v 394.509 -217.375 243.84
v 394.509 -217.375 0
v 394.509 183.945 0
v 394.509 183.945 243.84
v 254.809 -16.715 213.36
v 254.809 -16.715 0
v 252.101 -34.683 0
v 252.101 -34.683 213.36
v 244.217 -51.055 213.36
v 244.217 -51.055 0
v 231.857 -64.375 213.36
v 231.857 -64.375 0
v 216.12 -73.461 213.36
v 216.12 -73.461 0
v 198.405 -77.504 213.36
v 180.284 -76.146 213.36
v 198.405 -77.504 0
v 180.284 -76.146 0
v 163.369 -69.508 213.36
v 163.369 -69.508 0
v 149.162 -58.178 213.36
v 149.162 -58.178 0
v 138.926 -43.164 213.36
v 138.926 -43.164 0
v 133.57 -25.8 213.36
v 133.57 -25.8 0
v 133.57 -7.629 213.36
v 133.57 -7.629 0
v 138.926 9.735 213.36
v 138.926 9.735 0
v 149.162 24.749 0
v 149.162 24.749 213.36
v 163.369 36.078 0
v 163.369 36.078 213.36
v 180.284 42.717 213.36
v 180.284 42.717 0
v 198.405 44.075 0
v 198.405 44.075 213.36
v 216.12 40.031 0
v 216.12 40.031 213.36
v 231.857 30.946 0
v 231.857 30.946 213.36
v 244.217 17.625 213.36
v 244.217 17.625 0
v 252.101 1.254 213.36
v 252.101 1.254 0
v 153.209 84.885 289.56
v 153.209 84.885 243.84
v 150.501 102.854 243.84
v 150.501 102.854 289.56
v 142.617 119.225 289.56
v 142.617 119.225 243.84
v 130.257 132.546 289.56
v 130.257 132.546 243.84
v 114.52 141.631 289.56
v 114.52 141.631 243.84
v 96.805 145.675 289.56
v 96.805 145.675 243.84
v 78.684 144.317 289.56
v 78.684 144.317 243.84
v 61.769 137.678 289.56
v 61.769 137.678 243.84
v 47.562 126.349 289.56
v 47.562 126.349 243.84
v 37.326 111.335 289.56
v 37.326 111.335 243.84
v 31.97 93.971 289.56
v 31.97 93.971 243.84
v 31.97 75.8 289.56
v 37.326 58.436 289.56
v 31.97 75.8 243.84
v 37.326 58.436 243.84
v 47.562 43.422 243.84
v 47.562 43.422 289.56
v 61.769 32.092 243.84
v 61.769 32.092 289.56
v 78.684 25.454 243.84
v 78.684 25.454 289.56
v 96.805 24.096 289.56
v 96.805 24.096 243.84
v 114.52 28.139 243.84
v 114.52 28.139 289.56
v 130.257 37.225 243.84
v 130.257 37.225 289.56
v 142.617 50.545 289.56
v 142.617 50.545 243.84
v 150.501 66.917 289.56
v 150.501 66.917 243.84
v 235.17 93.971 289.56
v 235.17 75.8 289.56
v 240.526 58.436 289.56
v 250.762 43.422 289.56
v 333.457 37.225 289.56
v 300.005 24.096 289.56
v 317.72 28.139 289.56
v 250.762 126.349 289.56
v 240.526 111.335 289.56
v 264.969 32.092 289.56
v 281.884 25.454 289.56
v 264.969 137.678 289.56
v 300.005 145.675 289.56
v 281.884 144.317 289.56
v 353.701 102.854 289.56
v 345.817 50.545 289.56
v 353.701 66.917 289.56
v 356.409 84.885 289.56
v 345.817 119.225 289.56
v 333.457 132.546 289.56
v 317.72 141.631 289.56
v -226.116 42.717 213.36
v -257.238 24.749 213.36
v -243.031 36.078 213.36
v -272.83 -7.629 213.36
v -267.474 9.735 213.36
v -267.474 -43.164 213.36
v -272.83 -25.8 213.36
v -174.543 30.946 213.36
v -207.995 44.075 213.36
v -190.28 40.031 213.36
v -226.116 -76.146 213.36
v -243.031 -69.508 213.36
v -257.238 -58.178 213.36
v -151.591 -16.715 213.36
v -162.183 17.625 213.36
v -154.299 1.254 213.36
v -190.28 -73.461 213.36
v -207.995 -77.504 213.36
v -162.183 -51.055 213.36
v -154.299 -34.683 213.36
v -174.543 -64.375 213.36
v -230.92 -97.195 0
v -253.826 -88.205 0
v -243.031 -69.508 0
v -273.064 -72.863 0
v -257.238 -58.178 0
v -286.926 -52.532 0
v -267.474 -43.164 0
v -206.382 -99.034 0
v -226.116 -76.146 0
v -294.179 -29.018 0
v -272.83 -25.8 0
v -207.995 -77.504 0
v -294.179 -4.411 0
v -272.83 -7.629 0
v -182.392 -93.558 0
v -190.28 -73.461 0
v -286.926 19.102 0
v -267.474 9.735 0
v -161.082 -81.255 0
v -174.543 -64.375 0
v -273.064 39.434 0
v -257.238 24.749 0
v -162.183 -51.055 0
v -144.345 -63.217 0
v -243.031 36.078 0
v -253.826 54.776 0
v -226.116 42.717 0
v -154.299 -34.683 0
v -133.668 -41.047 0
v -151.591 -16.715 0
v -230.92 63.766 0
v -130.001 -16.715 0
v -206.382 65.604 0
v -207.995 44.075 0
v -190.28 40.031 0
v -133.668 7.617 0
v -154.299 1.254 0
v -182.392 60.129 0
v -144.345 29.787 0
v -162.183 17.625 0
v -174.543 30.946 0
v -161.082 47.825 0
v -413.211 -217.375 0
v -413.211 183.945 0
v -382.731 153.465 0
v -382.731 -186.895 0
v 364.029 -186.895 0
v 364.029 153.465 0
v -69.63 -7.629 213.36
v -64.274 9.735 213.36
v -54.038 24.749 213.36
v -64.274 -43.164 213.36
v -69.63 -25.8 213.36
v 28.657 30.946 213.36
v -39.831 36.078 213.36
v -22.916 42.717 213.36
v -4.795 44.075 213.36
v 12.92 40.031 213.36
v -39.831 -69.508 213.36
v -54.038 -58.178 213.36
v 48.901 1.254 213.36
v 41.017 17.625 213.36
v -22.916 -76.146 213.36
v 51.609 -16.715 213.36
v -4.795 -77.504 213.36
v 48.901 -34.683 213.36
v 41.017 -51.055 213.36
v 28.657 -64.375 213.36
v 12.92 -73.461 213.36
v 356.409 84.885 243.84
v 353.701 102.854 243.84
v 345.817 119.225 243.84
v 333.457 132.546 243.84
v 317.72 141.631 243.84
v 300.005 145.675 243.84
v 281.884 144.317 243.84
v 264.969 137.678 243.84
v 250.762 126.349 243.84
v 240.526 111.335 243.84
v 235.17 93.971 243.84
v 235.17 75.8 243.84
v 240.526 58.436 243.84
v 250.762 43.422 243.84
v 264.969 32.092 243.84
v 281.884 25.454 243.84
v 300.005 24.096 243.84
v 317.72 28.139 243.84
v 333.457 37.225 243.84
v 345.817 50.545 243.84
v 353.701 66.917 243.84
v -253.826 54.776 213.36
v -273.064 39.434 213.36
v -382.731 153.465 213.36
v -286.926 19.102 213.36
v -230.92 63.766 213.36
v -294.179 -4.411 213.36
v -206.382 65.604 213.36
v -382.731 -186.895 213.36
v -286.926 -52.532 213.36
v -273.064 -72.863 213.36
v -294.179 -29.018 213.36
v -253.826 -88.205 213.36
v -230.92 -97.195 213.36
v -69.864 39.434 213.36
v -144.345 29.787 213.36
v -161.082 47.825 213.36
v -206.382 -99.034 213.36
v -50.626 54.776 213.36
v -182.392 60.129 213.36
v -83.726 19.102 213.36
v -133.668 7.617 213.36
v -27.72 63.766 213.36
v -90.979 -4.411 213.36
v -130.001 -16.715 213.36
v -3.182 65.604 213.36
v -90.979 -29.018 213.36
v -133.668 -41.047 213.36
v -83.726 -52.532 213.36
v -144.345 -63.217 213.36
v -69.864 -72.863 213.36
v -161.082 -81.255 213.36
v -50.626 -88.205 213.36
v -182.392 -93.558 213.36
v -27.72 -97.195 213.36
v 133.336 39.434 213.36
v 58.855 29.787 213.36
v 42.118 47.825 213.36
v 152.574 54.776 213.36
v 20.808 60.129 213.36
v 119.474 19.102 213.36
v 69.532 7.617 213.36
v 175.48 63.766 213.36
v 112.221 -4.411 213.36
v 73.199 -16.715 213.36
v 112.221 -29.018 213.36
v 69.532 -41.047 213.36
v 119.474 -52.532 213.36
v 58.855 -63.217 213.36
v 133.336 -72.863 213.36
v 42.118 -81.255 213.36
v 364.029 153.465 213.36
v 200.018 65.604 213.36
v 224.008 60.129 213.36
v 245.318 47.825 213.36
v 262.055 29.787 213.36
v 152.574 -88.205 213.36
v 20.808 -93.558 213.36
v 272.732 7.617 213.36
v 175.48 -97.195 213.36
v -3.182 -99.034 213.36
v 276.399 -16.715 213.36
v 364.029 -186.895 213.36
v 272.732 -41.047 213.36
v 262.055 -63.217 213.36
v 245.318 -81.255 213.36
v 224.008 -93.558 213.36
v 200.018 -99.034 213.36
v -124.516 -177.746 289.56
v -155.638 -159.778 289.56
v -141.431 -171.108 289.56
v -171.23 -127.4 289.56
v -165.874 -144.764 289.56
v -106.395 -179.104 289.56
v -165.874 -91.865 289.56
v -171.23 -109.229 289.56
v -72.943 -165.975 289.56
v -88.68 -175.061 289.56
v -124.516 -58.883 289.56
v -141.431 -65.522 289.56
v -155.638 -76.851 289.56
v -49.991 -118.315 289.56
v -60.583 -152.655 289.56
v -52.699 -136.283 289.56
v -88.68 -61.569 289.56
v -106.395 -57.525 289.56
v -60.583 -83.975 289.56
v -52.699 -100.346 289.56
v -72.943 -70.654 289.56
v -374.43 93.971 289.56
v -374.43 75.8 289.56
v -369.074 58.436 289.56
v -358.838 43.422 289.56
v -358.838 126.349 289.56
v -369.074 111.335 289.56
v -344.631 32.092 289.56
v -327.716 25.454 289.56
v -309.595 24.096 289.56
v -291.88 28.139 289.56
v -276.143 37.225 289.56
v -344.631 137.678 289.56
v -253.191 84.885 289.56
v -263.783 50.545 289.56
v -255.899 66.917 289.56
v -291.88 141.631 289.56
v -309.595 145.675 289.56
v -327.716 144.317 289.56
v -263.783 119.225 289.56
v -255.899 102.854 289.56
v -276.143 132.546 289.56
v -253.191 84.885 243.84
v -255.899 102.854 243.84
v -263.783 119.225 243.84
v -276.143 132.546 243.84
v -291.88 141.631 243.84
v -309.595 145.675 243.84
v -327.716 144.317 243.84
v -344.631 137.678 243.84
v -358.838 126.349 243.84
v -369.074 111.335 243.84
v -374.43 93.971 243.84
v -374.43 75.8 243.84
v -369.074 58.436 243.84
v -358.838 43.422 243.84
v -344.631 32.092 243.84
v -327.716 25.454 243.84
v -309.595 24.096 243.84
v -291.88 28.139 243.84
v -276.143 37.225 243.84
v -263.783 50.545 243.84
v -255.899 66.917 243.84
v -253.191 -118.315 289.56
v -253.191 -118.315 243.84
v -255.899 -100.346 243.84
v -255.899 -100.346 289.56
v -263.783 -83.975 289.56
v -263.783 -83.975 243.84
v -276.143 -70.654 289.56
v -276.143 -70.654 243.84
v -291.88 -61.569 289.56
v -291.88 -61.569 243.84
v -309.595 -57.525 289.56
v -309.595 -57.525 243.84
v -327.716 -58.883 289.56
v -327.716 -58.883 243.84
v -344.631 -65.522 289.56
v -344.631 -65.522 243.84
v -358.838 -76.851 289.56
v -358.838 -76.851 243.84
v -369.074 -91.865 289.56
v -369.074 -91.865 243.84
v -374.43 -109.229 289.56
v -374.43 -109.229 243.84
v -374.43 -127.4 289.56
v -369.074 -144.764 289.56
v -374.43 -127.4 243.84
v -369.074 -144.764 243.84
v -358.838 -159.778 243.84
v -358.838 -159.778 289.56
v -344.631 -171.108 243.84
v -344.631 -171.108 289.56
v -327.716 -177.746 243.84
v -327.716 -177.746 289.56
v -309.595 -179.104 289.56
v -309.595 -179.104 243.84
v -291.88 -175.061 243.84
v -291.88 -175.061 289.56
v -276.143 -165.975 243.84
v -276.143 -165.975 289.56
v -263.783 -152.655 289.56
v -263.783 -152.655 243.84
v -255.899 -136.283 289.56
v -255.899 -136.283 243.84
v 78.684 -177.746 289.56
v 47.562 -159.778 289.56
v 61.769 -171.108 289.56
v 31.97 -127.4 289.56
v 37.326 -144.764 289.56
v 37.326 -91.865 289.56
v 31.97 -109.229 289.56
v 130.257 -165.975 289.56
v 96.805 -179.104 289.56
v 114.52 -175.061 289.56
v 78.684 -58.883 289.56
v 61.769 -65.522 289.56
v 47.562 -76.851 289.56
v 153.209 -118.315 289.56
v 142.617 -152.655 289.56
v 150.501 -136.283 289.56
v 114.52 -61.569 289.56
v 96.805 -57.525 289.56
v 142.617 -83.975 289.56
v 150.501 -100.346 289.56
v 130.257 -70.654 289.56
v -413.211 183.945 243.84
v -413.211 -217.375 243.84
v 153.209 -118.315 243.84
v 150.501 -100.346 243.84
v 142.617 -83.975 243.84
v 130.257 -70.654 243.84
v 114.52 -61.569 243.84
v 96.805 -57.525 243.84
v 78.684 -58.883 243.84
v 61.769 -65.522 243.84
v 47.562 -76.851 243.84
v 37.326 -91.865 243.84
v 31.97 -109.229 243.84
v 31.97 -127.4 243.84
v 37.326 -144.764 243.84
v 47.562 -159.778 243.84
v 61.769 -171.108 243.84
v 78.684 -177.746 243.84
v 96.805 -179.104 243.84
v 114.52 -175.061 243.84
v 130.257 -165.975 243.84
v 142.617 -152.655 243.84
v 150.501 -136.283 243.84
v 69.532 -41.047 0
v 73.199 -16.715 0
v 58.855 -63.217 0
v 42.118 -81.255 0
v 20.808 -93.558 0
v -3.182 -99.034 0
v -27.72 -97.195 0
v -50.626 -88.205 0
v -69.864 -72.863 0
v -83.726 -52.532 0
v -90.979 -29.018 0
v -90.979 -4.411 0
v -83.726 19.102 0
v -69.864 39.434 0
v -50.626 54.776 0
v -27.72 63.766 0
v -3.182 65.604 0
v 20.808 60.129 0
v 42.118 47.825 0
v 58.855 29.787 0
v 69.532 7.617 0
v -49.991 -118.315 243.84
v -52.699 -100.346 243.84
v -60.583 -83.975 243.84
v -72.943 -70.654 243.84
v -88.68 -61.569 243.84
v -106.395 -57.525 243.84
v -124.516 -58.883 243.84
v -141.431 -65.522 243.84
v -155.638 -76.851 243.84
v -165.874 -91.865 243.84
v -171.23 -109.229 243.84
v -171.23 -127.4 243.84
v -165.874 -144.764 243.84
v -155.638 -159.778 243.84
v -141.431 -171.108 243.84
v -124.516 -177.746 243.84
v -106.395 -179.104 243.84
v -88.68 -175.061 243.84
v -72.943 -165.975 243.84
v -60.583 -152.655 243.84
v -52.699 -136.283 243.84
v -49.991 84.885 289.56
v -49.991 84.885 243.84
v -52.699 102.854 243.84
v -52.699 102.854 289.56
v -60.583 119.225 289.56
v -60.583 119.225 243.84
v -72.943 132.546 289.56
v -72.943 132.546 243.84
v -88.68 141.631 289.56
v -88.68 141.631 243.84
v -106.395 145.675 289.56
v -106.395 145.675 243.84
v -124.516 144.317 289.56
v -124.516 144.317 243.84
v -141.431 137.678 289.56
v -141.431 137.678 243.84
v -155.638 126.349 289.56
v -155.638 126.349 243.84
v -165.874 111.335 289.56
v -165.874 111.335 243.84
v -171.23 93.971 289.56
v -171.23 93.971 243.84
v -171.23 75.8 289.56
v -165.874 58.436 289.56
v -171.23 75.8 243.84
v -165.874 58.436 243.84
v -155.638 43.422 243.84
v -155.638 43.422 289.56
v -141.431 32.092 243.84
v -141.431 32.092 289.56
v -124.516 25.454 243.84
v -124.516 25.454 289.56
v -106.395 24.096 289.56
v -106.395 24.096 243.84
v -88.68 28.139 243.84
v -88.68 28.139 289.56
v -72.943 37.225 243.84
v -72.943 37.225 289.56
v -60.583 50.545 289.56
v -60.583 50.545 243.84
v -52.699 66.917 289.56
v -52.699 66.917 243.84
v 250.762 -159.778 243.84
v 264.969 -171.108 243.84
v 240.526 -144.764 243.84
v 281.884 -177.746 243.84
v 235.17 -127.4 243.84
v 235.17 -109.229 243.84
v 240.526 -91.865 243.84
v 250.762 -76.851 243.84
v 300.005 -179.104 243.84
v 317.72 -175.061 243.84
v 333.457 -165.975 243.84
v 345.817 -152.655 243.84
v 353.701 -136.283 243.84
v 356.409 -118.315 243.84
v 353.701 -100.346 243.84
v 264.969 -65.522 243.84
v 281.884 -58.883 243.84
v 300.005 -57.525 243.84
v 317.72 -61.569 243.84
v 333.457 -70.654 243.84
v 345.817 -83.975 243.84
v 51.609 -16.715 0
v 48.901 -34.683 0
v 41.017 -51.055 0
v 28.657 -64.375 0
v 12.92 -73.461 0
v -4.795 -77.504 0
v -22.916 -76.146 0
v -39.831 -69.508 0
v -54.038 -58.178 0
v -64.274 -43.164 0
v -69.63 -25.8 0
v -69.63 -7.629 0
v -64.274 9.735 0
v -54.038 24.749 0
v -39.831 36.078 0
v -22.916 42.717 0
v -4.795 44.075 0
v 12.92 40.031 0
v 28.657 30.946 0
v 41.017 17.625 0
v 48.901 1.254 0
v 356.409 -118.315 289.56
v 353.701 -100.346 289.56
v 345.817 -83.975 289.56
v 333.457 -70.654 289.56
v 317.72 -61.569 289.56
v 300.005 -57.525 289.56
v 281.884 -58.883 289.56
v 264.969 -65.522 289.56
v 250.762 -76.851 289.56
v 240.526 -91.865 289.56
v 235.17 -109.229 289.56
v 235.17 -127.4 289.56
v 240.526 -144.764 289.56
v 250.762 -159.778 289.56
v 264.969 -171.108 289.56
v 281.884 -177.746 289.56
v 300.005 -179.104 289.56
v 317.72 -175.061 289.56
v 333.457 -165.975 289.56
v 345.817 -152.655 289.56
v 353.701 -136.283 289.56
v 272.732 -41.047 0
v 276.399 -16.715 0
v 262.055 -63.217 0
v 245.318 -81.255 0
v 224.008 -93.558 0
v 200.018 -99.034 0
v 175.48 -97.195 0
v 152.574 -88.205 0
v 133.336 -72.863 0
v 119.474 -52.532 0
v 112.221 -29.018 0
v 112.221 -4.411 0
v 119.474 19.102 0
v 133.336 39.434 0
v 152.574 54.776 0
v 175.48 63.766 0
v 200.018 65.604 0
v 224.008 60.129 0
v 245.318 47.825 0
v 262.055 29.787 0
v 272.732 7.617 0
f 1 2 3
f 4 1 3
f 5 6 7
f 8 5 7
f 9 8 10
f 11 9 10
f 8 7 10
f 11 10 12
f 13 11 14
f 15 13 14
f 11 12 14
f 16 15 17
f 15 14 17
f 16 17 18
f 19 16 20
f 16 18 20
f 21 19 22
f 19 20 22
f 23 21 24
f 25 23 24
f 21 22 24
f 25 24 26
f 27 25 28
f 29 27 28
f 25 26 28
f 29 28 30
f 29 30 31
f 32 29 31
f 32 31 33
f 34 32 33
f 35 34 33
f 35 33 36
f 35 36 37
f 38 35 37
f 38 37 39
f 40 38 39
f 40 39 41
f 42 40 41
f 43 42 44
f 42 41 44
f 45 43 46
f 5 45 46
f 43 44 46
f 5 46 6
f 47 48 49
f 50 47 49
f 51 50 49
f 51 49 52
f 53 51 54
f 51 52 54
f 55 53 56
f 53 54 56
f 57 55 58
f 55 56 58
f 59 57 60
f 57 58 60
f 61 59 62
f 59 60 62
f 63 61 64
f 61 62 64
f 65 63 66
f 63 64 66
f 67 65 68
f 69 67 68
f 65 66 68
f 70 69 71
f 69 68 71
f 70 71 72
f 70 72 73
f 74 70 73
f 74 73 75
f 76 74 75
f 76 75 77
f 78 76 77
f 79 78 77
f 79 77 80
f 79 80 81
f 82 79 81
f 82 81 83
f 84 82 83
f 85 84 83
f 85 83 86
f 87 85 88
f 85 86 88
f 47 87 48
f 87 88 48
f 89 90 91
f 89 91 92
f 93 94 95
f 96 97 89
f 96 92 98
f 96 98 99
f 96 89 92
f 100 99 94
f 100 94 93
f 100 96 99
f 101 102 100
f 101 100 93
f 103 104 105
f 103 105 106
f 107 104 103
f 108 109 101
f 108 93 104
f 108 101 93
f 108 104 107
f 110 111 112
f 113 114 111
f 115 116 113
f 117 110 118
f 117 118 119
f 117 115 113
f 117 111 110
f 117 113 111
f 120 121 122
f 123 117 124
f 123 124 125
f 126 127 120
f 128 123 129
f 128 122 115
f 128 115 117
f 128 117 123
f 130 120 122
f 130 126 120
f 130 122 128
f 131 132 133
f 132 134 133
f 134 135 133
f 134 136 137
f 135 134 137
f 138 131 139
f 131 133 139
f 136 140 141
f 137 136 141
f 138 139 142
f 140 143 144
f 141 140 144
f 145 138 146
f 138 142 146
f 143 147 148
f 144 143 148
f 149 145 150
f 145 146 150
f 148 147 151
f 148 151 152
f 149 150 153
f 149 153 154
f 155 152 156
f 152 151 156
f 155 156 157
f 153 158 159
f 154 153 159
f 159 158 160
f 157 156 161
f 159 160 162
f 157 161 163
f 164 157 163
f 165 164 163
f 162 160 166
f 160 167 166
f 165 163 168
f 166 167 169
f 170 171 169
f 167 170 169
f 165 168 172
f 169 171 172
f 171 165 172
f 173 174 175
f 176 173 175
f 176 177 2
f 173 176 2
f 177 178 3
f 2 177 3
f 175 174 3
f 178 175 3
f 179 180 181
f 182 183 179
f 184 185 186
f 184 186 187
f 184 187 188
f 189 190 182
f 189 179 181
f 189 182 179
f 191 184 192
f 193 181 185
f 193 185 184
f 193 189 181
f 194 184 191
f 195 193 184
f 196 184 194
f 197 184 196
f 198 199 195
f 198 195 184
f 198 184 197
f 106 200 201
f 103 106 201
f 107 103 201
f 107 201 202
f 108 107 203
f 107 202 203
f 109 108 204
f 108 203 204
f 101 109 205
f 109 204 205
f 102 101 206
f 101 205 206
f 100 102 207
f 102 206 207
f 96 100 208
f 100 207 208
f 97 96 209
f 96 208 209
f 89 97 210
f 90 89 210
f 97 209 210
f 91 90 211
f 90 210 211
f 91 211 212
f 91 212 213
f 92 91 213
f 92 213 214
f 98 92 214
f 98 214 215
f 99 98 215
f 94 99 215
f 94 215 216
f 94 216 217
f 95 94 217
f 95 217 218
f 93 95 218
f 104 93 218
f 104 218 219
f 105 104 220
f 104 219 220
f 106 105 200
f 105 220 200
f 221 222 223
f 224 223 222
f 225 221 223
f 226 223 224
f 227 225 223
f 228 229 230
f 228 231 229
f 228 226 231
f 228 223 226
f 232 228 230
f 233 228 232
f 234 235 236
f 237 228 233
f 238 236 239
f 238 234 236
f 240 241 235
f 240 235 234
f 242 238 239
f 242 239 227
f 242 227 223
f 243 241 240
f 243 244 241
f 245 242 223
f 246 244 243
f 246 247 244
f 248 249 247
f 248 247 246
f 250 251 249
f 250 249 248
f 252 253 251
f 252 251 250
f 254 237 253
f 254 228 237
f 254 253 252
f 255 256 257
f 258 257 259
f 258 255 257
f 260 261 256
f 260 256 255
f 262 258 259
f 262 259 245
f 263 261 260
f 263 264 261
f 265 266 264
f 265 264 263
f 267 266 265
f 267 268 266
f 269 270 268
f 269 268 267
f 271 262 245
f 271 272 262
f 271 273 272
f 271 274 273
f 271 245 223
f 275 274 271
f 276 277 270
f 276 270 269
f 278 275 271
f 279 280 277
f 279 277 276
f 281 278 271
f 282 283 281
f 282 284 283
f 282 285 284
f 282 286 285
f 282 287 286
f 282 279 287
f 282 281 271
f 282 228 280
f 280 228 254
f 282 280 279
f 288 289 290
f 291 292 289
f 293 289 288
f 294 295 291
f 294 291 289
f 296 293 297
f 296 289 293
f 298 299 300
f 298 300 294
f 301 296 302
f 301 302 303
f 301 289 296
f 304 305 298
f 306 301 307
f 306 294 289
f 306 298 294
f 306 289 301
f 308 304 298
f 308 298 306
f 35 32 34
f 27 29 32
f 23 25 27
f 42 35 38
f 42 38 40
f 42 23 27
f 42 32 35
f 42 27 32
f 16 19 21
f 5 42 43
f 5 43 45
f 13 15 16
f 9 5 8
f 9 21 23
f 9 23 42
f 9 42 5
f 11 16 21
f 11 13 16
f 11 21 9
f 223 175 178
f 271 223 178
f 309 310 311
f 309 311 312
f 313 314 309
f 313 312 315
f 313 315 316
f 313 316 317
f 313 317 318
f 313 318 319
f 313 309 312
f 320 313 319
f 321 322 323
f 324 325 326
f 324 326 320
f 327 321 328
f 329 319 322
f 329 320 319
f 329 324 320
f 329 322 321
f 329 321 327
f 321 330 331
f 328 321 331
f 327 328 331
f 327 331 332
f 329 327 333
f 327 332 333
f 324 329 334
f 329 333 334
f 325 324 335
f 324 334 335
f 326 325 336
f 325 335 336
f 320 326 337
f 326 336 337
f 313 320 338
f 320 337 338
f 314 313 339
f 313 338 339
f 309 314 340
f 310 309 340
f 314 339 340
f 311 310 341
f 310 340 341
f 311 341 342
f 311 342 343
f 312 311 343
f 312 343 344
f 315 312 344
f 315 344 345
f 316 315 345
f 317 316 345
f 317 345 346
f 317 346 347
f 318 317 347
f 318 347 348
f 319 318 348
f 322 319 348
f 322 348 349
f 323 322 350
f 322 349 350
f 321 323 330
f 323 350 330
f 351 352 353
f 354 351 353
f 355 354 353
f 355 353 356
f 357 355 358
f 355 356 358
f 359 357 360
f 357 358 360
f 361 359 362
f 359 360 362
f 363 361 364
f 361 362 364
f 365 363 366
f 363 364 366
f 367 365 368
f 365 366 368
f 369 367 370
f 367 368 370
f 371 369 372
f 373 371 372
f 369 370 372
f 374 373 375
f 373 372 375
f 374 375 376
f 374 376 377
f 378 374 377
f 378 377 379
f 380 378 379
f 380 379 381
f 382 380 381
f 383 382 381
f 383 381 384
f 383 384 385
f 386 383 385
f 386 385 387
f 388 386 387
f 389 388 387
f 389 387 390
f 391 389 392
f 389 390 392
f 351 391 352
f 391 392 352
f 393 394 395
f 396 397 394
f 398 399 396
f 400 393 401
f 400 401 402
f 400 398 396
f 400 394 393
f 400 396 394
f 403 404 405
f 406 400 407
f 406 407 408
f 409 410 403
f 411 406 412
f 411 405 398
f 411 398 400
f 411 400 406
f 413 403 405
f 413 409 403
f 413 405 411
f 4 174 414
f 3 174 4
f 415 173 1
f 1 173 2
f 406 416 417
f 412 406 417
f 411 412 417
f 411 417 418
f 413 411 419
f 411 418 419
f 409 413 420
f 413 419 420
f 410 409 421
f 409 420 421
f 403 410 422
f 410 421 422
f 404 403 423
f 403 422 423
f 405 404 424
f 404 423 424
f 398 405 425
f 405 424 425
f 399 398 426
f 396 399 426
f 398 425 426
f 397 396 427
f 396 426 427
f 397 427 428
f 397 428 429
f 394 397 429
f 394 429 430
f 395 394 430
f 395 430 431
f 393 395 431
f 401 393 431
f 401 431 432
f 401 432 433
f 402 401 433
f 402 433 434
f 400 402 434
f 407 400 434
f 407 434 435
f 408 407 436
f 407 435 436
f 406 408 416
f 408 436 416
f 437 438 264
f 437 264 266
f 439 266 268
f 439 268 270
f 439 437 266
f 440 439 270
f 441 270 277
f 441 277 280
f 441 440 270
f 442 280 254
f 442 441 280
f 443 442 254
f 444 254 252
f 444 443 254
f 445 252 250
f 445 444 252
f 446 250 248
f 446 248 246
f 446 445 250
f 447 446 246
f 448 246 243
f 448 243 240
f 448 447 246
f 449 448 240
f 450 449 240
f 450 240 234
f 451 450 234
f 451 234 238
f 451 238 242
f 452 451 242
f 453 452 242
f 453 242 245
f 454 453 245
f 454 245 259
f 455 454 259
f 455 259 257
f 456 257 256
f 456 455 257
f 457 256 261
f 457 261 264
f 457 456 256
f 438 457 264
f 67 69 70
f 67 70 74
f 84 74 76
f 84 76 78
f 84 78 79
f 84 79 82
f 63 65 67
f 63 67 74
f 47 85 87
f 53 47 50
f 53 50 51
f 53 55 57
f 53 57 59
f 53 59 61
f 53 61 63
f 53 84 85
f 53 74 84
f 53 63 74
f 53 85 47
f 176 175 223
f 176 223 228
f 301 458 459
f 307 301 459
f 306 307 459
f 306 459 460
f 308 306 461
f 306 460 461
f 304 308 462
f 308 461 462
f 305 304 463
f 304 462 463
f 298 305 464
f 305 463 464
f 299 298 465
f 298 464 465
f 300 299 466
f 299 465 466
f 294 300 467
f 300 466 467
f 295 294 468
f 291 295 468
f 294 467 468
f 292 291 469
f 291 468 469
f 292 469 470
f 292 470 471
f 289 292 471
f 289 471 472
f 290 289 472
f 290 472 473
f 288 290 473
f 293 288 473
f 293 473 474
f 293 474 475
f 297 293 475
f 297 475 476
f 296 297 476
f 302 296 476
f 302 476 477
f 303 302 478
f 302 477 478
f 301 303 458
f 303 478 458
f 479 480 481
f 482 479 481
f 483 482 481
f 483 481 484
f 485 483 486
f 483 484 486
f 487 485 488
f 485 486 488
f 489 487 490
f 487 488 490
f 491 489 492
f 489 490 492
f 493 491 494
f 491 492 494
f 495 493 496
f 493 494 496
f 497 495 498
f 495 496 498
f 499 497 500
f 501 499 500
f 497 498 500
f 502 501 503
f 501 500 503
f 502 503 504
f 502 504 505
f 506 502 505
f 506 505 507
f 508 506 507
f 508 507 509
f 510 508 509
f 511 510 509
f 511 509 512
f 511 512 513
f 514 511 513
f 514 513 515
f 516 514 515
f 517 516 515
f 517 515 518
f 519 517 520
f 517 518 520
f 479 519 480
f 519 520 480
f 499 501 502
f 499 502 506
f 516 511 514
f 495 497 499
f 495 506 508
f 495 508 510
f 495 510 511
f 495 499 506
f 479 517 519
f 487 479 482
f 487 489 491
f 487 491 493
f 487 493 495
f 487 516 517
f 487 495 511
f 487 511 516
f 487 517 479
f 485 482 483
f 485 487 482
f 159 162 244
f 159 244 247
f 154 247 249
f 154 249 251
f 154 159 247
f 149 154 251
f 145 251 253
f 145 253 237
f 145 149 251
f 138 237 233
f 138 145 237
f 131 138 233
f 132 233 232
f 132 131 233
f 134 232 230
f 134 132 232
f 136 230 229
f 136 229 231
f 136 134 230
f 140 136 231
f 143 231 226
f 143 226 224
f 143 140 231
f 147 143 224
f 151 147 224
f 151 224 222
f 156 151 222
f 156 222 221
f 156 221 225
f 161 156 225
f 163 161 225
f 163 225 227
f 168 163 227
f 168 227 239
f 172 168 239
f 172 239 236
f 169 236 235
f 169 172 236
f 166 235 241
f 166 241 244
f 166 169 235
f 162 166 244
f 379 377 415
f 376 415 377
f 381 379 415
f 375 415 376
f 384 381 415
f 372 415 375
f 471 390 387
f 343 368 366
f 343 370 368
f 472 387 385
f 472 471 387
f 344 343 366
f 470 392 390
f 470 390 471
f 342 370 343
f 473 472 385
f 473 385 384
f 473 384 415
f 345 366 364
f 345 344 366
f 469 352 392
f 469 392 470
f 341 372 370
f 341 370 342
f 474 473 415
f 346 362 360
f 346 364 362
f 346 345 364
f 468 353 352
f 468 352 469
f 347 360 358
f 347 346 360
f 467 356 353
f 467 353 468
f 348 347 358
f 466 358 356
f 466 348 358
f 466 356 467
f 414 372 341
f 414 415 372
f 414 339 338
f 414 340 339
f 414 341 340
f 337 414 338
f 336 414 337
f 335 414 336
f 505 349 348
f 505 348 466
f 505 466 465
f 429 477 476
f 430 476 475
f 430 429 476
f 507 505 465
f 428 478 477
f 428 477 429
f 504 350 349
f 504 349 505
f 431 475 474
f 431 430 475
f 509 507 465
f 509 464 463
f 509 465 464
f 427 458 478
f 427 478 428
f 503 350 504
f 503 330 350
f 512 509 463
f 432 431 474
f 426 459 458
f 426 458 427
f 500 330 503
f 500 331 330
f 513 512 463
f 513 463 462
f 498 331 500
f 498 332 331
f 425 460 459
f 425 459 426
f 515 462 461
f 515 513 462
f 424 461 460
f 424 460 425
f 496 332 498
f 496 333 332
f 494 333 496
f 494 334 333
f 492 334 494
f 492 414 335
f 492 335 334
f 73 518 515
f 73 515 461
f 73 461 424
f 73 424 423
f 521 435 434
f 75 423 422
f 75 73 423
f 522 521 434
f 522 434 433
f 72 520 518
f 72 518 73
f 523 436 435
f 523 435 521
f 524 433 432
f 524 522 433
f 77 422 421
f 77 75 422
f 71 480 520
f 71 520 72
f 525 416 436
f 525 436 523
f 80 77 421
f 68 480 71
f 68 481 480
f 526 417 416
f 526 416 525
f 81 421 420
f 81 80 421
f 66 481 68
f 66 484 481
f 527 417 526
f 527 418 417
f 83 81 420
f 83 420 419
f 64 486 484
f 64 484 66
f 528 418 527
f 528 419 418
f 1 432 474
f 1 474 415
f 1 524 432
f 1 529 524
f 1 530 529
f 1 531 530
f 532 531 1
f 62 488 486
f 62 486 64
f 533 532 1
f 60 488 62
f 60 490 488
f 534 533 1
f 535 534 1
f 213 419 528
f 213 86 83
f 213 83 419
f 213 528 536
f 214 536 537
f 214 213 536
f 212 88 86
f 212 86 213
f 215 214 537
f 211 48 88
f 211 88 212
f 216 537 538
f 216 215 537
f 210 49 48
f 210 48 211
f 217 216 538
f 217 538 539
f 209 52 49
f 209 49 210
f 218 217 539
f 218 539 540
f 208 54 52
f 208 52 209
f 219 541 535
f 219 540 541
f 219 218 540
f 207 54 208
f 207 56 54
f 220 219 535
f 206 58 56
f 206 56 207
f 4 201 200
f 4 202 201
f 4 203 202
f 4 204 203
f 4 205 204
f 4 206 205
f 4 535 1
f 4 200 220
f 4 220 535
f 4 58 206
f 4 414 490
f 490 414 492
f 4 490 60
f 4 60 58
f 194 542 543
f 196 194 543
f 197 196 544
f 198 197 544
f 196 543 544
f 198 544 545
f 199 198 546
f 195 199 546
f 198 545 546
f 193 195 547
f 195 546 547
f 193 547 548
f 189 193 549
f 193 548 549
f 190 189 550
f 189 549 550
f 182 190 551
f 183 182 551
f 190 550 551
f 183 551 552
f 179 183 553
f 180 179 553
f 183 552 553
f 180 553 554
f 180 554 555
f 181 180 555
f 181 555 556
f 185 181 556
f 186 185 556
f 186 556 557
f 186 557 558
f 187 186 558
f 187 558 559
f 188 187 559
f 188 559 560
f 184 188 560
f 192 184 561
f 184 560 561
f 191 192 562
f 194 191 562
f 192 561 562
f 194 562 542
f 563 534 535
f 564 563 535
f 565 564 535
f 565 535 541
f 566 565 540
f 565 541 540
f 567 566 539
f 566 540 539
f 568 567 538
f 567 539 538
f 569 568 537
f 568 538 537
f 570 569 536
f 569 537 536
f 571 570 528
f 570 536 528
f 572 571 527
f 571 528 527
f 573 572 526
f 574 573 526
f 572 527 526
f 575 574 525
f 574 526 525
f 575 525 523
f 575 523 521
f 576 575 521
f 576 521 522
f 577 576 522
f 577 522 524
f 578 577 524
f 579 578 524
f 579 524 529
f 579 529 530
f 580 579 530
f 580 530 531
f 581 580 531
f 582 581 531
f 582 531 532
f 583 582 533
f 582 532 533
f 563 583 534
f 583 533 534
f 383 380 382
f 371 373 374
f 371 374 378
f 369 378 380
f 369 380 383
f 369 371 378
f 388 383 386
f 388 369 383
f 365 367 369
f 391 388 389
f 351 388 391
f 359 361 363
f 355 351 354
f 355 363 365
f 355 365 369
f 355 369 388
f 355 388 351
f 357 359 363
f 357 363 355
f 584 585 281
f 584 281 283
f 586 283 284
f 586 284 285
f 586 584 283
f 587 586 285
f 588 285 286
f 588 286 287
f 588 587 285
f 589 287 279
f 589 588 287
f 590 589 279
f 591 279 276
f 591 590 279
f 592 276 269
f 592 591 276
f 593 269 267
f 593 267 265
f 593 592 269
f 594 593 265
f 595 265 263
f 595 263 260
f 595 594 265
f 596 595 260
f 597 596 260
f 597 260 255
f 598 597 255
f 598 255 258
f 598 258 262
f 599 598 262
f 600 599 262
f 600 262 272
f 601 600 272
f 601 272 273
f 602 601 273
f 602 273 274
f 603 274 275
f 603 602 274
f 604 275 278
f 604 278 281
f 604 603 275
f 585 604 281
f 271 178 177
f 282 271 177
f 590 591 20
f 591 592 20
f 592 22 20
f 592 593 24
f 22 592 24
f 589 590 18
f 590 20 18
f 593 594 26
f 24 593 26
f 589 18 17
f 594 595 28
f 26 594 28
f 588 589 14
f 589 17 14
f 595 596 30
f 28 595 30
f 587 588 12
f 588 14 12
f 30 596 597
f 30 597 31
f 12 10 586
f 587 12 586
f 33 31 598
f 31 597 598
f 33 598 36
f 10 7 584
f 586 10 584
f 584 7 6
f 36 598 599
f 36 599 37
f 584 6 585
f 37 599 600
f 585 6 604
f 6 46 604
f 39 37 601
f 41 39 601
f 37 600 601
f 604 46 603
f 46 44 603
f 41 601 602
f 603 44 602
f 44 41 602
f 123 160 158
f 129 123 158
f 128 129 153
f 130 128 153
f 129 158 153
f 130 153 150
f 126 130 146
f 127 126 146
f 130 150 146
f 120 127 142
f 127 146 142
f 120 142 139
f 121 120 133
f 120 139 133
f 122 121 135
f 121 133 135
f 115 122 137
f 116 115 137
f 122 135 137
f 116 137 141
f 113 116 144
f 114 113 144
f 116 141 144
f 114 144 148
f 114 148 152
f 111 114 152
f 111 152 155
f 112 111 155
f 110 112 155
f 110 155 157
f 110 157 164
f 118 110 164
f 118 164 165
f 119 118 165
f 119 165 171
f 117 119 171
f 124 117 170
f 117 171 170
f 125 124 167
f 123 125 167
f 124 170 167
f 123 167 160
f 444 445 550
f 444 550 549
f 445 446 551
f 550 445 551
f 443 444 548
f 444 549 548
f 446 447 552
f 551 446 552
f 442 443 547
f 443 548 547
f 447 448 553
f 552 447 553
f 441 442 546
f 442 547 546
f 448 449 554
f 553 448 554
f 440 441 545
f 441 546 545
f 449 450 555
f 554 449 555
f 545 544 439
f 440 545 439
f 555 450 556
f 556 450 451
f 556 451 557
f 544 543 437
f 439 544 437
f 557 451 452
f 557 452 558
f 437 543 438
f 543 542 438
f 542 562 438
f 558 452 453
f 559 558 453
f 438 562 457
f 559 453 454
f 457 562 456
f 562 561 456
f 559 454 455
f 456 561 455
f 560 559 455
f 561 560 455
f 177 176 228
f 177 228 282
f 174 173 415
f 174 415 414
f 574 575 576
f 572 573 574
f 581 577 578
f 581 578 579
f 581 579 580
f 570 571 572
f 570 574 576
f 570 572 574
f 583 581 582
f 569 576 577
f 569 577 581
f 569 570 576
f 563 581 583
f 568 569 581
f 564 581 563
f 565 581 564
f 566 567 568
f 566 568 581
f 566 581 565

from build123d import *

# Parameters (mm, degrees)
F0_W     = 807.72
F0_H     = 401.32
F1_DEPTH = 243.84
F2_R     = 60.96
F3_DEPTH = 45.72
F4_W     = 746.76
F4_H     = 340.36
F4_R     = 82.55
F4_R_2   = 60.96
F5_DEPTH = 213.36


with BuildPart() as f1:
    # F0 (on Top) → F1 (new body)
    with BuildSketch(Plane.XY):
        with Locations((-9.350765, -16.714708)):
            Rectangle(F0_W, F0_H)
    extrude(amount=F1_DEPTH)

    # F2 (on face) → F3 (join)
    with BuildSketch(Plane.XY.offset(243.84)):
        with Locations((-314.150765, 84.885292)):
            Circle(F2_R)
        with Locations((-314.150765, -118.314708)):
            Circle(F2_R)
        with Locations((-110.950765, 84.885292)):
            Circle(F2_R)
        with Locations((92.249235, 84.885292)):
            Circle(F2_R)
        with Locations((92.249235, -118.314708)):
            Circle(F2_R)
        with Locations((-110.950765, -118.314708)):
            Circle(F2_R)
        with Locations((295.449235, 84.885292)):
            Circle(F2_R)
        with Locations((295.449235, -118.314708)):
            Circle(F2_R)
    extrude(amount=F3_DEPTH)

    # F4 (on face) → F5 (cut)
    with BuildSketch(Plane(origin=(0, 0, 0), x_dir=(1, 0, 0), z_dir=(0, 0, -1))):
        with Locations((-9.350765, 16.714708)):
            Rectangle(F4_W, F4_H)
        with Locations((-212.550765, 16.714708)):
            Circle(F4_R, mode=Mode.SUBTRACT)
        with Locations((-9.350765, 16.714708)):
            Circle(F4_R, mode=Mode.SUBTRACT)
        with Locations((193.849235, 16.714708)):
            Circle(F4_R, mode=Mode.SUBTRACT)
        with Locations((-212.550765, 16.714708)):
            Circle(F4_R_2)
        with Locations((-9.350765, 16.714708)):
            Circle(F4_R_2)
        with Locations((193.849235, 16.714708)):
            Circle(F4_R_2)
    extrude(amount=-F5_DEPTH, mode=Mode.SUBTRACT)


solid = f1.part
